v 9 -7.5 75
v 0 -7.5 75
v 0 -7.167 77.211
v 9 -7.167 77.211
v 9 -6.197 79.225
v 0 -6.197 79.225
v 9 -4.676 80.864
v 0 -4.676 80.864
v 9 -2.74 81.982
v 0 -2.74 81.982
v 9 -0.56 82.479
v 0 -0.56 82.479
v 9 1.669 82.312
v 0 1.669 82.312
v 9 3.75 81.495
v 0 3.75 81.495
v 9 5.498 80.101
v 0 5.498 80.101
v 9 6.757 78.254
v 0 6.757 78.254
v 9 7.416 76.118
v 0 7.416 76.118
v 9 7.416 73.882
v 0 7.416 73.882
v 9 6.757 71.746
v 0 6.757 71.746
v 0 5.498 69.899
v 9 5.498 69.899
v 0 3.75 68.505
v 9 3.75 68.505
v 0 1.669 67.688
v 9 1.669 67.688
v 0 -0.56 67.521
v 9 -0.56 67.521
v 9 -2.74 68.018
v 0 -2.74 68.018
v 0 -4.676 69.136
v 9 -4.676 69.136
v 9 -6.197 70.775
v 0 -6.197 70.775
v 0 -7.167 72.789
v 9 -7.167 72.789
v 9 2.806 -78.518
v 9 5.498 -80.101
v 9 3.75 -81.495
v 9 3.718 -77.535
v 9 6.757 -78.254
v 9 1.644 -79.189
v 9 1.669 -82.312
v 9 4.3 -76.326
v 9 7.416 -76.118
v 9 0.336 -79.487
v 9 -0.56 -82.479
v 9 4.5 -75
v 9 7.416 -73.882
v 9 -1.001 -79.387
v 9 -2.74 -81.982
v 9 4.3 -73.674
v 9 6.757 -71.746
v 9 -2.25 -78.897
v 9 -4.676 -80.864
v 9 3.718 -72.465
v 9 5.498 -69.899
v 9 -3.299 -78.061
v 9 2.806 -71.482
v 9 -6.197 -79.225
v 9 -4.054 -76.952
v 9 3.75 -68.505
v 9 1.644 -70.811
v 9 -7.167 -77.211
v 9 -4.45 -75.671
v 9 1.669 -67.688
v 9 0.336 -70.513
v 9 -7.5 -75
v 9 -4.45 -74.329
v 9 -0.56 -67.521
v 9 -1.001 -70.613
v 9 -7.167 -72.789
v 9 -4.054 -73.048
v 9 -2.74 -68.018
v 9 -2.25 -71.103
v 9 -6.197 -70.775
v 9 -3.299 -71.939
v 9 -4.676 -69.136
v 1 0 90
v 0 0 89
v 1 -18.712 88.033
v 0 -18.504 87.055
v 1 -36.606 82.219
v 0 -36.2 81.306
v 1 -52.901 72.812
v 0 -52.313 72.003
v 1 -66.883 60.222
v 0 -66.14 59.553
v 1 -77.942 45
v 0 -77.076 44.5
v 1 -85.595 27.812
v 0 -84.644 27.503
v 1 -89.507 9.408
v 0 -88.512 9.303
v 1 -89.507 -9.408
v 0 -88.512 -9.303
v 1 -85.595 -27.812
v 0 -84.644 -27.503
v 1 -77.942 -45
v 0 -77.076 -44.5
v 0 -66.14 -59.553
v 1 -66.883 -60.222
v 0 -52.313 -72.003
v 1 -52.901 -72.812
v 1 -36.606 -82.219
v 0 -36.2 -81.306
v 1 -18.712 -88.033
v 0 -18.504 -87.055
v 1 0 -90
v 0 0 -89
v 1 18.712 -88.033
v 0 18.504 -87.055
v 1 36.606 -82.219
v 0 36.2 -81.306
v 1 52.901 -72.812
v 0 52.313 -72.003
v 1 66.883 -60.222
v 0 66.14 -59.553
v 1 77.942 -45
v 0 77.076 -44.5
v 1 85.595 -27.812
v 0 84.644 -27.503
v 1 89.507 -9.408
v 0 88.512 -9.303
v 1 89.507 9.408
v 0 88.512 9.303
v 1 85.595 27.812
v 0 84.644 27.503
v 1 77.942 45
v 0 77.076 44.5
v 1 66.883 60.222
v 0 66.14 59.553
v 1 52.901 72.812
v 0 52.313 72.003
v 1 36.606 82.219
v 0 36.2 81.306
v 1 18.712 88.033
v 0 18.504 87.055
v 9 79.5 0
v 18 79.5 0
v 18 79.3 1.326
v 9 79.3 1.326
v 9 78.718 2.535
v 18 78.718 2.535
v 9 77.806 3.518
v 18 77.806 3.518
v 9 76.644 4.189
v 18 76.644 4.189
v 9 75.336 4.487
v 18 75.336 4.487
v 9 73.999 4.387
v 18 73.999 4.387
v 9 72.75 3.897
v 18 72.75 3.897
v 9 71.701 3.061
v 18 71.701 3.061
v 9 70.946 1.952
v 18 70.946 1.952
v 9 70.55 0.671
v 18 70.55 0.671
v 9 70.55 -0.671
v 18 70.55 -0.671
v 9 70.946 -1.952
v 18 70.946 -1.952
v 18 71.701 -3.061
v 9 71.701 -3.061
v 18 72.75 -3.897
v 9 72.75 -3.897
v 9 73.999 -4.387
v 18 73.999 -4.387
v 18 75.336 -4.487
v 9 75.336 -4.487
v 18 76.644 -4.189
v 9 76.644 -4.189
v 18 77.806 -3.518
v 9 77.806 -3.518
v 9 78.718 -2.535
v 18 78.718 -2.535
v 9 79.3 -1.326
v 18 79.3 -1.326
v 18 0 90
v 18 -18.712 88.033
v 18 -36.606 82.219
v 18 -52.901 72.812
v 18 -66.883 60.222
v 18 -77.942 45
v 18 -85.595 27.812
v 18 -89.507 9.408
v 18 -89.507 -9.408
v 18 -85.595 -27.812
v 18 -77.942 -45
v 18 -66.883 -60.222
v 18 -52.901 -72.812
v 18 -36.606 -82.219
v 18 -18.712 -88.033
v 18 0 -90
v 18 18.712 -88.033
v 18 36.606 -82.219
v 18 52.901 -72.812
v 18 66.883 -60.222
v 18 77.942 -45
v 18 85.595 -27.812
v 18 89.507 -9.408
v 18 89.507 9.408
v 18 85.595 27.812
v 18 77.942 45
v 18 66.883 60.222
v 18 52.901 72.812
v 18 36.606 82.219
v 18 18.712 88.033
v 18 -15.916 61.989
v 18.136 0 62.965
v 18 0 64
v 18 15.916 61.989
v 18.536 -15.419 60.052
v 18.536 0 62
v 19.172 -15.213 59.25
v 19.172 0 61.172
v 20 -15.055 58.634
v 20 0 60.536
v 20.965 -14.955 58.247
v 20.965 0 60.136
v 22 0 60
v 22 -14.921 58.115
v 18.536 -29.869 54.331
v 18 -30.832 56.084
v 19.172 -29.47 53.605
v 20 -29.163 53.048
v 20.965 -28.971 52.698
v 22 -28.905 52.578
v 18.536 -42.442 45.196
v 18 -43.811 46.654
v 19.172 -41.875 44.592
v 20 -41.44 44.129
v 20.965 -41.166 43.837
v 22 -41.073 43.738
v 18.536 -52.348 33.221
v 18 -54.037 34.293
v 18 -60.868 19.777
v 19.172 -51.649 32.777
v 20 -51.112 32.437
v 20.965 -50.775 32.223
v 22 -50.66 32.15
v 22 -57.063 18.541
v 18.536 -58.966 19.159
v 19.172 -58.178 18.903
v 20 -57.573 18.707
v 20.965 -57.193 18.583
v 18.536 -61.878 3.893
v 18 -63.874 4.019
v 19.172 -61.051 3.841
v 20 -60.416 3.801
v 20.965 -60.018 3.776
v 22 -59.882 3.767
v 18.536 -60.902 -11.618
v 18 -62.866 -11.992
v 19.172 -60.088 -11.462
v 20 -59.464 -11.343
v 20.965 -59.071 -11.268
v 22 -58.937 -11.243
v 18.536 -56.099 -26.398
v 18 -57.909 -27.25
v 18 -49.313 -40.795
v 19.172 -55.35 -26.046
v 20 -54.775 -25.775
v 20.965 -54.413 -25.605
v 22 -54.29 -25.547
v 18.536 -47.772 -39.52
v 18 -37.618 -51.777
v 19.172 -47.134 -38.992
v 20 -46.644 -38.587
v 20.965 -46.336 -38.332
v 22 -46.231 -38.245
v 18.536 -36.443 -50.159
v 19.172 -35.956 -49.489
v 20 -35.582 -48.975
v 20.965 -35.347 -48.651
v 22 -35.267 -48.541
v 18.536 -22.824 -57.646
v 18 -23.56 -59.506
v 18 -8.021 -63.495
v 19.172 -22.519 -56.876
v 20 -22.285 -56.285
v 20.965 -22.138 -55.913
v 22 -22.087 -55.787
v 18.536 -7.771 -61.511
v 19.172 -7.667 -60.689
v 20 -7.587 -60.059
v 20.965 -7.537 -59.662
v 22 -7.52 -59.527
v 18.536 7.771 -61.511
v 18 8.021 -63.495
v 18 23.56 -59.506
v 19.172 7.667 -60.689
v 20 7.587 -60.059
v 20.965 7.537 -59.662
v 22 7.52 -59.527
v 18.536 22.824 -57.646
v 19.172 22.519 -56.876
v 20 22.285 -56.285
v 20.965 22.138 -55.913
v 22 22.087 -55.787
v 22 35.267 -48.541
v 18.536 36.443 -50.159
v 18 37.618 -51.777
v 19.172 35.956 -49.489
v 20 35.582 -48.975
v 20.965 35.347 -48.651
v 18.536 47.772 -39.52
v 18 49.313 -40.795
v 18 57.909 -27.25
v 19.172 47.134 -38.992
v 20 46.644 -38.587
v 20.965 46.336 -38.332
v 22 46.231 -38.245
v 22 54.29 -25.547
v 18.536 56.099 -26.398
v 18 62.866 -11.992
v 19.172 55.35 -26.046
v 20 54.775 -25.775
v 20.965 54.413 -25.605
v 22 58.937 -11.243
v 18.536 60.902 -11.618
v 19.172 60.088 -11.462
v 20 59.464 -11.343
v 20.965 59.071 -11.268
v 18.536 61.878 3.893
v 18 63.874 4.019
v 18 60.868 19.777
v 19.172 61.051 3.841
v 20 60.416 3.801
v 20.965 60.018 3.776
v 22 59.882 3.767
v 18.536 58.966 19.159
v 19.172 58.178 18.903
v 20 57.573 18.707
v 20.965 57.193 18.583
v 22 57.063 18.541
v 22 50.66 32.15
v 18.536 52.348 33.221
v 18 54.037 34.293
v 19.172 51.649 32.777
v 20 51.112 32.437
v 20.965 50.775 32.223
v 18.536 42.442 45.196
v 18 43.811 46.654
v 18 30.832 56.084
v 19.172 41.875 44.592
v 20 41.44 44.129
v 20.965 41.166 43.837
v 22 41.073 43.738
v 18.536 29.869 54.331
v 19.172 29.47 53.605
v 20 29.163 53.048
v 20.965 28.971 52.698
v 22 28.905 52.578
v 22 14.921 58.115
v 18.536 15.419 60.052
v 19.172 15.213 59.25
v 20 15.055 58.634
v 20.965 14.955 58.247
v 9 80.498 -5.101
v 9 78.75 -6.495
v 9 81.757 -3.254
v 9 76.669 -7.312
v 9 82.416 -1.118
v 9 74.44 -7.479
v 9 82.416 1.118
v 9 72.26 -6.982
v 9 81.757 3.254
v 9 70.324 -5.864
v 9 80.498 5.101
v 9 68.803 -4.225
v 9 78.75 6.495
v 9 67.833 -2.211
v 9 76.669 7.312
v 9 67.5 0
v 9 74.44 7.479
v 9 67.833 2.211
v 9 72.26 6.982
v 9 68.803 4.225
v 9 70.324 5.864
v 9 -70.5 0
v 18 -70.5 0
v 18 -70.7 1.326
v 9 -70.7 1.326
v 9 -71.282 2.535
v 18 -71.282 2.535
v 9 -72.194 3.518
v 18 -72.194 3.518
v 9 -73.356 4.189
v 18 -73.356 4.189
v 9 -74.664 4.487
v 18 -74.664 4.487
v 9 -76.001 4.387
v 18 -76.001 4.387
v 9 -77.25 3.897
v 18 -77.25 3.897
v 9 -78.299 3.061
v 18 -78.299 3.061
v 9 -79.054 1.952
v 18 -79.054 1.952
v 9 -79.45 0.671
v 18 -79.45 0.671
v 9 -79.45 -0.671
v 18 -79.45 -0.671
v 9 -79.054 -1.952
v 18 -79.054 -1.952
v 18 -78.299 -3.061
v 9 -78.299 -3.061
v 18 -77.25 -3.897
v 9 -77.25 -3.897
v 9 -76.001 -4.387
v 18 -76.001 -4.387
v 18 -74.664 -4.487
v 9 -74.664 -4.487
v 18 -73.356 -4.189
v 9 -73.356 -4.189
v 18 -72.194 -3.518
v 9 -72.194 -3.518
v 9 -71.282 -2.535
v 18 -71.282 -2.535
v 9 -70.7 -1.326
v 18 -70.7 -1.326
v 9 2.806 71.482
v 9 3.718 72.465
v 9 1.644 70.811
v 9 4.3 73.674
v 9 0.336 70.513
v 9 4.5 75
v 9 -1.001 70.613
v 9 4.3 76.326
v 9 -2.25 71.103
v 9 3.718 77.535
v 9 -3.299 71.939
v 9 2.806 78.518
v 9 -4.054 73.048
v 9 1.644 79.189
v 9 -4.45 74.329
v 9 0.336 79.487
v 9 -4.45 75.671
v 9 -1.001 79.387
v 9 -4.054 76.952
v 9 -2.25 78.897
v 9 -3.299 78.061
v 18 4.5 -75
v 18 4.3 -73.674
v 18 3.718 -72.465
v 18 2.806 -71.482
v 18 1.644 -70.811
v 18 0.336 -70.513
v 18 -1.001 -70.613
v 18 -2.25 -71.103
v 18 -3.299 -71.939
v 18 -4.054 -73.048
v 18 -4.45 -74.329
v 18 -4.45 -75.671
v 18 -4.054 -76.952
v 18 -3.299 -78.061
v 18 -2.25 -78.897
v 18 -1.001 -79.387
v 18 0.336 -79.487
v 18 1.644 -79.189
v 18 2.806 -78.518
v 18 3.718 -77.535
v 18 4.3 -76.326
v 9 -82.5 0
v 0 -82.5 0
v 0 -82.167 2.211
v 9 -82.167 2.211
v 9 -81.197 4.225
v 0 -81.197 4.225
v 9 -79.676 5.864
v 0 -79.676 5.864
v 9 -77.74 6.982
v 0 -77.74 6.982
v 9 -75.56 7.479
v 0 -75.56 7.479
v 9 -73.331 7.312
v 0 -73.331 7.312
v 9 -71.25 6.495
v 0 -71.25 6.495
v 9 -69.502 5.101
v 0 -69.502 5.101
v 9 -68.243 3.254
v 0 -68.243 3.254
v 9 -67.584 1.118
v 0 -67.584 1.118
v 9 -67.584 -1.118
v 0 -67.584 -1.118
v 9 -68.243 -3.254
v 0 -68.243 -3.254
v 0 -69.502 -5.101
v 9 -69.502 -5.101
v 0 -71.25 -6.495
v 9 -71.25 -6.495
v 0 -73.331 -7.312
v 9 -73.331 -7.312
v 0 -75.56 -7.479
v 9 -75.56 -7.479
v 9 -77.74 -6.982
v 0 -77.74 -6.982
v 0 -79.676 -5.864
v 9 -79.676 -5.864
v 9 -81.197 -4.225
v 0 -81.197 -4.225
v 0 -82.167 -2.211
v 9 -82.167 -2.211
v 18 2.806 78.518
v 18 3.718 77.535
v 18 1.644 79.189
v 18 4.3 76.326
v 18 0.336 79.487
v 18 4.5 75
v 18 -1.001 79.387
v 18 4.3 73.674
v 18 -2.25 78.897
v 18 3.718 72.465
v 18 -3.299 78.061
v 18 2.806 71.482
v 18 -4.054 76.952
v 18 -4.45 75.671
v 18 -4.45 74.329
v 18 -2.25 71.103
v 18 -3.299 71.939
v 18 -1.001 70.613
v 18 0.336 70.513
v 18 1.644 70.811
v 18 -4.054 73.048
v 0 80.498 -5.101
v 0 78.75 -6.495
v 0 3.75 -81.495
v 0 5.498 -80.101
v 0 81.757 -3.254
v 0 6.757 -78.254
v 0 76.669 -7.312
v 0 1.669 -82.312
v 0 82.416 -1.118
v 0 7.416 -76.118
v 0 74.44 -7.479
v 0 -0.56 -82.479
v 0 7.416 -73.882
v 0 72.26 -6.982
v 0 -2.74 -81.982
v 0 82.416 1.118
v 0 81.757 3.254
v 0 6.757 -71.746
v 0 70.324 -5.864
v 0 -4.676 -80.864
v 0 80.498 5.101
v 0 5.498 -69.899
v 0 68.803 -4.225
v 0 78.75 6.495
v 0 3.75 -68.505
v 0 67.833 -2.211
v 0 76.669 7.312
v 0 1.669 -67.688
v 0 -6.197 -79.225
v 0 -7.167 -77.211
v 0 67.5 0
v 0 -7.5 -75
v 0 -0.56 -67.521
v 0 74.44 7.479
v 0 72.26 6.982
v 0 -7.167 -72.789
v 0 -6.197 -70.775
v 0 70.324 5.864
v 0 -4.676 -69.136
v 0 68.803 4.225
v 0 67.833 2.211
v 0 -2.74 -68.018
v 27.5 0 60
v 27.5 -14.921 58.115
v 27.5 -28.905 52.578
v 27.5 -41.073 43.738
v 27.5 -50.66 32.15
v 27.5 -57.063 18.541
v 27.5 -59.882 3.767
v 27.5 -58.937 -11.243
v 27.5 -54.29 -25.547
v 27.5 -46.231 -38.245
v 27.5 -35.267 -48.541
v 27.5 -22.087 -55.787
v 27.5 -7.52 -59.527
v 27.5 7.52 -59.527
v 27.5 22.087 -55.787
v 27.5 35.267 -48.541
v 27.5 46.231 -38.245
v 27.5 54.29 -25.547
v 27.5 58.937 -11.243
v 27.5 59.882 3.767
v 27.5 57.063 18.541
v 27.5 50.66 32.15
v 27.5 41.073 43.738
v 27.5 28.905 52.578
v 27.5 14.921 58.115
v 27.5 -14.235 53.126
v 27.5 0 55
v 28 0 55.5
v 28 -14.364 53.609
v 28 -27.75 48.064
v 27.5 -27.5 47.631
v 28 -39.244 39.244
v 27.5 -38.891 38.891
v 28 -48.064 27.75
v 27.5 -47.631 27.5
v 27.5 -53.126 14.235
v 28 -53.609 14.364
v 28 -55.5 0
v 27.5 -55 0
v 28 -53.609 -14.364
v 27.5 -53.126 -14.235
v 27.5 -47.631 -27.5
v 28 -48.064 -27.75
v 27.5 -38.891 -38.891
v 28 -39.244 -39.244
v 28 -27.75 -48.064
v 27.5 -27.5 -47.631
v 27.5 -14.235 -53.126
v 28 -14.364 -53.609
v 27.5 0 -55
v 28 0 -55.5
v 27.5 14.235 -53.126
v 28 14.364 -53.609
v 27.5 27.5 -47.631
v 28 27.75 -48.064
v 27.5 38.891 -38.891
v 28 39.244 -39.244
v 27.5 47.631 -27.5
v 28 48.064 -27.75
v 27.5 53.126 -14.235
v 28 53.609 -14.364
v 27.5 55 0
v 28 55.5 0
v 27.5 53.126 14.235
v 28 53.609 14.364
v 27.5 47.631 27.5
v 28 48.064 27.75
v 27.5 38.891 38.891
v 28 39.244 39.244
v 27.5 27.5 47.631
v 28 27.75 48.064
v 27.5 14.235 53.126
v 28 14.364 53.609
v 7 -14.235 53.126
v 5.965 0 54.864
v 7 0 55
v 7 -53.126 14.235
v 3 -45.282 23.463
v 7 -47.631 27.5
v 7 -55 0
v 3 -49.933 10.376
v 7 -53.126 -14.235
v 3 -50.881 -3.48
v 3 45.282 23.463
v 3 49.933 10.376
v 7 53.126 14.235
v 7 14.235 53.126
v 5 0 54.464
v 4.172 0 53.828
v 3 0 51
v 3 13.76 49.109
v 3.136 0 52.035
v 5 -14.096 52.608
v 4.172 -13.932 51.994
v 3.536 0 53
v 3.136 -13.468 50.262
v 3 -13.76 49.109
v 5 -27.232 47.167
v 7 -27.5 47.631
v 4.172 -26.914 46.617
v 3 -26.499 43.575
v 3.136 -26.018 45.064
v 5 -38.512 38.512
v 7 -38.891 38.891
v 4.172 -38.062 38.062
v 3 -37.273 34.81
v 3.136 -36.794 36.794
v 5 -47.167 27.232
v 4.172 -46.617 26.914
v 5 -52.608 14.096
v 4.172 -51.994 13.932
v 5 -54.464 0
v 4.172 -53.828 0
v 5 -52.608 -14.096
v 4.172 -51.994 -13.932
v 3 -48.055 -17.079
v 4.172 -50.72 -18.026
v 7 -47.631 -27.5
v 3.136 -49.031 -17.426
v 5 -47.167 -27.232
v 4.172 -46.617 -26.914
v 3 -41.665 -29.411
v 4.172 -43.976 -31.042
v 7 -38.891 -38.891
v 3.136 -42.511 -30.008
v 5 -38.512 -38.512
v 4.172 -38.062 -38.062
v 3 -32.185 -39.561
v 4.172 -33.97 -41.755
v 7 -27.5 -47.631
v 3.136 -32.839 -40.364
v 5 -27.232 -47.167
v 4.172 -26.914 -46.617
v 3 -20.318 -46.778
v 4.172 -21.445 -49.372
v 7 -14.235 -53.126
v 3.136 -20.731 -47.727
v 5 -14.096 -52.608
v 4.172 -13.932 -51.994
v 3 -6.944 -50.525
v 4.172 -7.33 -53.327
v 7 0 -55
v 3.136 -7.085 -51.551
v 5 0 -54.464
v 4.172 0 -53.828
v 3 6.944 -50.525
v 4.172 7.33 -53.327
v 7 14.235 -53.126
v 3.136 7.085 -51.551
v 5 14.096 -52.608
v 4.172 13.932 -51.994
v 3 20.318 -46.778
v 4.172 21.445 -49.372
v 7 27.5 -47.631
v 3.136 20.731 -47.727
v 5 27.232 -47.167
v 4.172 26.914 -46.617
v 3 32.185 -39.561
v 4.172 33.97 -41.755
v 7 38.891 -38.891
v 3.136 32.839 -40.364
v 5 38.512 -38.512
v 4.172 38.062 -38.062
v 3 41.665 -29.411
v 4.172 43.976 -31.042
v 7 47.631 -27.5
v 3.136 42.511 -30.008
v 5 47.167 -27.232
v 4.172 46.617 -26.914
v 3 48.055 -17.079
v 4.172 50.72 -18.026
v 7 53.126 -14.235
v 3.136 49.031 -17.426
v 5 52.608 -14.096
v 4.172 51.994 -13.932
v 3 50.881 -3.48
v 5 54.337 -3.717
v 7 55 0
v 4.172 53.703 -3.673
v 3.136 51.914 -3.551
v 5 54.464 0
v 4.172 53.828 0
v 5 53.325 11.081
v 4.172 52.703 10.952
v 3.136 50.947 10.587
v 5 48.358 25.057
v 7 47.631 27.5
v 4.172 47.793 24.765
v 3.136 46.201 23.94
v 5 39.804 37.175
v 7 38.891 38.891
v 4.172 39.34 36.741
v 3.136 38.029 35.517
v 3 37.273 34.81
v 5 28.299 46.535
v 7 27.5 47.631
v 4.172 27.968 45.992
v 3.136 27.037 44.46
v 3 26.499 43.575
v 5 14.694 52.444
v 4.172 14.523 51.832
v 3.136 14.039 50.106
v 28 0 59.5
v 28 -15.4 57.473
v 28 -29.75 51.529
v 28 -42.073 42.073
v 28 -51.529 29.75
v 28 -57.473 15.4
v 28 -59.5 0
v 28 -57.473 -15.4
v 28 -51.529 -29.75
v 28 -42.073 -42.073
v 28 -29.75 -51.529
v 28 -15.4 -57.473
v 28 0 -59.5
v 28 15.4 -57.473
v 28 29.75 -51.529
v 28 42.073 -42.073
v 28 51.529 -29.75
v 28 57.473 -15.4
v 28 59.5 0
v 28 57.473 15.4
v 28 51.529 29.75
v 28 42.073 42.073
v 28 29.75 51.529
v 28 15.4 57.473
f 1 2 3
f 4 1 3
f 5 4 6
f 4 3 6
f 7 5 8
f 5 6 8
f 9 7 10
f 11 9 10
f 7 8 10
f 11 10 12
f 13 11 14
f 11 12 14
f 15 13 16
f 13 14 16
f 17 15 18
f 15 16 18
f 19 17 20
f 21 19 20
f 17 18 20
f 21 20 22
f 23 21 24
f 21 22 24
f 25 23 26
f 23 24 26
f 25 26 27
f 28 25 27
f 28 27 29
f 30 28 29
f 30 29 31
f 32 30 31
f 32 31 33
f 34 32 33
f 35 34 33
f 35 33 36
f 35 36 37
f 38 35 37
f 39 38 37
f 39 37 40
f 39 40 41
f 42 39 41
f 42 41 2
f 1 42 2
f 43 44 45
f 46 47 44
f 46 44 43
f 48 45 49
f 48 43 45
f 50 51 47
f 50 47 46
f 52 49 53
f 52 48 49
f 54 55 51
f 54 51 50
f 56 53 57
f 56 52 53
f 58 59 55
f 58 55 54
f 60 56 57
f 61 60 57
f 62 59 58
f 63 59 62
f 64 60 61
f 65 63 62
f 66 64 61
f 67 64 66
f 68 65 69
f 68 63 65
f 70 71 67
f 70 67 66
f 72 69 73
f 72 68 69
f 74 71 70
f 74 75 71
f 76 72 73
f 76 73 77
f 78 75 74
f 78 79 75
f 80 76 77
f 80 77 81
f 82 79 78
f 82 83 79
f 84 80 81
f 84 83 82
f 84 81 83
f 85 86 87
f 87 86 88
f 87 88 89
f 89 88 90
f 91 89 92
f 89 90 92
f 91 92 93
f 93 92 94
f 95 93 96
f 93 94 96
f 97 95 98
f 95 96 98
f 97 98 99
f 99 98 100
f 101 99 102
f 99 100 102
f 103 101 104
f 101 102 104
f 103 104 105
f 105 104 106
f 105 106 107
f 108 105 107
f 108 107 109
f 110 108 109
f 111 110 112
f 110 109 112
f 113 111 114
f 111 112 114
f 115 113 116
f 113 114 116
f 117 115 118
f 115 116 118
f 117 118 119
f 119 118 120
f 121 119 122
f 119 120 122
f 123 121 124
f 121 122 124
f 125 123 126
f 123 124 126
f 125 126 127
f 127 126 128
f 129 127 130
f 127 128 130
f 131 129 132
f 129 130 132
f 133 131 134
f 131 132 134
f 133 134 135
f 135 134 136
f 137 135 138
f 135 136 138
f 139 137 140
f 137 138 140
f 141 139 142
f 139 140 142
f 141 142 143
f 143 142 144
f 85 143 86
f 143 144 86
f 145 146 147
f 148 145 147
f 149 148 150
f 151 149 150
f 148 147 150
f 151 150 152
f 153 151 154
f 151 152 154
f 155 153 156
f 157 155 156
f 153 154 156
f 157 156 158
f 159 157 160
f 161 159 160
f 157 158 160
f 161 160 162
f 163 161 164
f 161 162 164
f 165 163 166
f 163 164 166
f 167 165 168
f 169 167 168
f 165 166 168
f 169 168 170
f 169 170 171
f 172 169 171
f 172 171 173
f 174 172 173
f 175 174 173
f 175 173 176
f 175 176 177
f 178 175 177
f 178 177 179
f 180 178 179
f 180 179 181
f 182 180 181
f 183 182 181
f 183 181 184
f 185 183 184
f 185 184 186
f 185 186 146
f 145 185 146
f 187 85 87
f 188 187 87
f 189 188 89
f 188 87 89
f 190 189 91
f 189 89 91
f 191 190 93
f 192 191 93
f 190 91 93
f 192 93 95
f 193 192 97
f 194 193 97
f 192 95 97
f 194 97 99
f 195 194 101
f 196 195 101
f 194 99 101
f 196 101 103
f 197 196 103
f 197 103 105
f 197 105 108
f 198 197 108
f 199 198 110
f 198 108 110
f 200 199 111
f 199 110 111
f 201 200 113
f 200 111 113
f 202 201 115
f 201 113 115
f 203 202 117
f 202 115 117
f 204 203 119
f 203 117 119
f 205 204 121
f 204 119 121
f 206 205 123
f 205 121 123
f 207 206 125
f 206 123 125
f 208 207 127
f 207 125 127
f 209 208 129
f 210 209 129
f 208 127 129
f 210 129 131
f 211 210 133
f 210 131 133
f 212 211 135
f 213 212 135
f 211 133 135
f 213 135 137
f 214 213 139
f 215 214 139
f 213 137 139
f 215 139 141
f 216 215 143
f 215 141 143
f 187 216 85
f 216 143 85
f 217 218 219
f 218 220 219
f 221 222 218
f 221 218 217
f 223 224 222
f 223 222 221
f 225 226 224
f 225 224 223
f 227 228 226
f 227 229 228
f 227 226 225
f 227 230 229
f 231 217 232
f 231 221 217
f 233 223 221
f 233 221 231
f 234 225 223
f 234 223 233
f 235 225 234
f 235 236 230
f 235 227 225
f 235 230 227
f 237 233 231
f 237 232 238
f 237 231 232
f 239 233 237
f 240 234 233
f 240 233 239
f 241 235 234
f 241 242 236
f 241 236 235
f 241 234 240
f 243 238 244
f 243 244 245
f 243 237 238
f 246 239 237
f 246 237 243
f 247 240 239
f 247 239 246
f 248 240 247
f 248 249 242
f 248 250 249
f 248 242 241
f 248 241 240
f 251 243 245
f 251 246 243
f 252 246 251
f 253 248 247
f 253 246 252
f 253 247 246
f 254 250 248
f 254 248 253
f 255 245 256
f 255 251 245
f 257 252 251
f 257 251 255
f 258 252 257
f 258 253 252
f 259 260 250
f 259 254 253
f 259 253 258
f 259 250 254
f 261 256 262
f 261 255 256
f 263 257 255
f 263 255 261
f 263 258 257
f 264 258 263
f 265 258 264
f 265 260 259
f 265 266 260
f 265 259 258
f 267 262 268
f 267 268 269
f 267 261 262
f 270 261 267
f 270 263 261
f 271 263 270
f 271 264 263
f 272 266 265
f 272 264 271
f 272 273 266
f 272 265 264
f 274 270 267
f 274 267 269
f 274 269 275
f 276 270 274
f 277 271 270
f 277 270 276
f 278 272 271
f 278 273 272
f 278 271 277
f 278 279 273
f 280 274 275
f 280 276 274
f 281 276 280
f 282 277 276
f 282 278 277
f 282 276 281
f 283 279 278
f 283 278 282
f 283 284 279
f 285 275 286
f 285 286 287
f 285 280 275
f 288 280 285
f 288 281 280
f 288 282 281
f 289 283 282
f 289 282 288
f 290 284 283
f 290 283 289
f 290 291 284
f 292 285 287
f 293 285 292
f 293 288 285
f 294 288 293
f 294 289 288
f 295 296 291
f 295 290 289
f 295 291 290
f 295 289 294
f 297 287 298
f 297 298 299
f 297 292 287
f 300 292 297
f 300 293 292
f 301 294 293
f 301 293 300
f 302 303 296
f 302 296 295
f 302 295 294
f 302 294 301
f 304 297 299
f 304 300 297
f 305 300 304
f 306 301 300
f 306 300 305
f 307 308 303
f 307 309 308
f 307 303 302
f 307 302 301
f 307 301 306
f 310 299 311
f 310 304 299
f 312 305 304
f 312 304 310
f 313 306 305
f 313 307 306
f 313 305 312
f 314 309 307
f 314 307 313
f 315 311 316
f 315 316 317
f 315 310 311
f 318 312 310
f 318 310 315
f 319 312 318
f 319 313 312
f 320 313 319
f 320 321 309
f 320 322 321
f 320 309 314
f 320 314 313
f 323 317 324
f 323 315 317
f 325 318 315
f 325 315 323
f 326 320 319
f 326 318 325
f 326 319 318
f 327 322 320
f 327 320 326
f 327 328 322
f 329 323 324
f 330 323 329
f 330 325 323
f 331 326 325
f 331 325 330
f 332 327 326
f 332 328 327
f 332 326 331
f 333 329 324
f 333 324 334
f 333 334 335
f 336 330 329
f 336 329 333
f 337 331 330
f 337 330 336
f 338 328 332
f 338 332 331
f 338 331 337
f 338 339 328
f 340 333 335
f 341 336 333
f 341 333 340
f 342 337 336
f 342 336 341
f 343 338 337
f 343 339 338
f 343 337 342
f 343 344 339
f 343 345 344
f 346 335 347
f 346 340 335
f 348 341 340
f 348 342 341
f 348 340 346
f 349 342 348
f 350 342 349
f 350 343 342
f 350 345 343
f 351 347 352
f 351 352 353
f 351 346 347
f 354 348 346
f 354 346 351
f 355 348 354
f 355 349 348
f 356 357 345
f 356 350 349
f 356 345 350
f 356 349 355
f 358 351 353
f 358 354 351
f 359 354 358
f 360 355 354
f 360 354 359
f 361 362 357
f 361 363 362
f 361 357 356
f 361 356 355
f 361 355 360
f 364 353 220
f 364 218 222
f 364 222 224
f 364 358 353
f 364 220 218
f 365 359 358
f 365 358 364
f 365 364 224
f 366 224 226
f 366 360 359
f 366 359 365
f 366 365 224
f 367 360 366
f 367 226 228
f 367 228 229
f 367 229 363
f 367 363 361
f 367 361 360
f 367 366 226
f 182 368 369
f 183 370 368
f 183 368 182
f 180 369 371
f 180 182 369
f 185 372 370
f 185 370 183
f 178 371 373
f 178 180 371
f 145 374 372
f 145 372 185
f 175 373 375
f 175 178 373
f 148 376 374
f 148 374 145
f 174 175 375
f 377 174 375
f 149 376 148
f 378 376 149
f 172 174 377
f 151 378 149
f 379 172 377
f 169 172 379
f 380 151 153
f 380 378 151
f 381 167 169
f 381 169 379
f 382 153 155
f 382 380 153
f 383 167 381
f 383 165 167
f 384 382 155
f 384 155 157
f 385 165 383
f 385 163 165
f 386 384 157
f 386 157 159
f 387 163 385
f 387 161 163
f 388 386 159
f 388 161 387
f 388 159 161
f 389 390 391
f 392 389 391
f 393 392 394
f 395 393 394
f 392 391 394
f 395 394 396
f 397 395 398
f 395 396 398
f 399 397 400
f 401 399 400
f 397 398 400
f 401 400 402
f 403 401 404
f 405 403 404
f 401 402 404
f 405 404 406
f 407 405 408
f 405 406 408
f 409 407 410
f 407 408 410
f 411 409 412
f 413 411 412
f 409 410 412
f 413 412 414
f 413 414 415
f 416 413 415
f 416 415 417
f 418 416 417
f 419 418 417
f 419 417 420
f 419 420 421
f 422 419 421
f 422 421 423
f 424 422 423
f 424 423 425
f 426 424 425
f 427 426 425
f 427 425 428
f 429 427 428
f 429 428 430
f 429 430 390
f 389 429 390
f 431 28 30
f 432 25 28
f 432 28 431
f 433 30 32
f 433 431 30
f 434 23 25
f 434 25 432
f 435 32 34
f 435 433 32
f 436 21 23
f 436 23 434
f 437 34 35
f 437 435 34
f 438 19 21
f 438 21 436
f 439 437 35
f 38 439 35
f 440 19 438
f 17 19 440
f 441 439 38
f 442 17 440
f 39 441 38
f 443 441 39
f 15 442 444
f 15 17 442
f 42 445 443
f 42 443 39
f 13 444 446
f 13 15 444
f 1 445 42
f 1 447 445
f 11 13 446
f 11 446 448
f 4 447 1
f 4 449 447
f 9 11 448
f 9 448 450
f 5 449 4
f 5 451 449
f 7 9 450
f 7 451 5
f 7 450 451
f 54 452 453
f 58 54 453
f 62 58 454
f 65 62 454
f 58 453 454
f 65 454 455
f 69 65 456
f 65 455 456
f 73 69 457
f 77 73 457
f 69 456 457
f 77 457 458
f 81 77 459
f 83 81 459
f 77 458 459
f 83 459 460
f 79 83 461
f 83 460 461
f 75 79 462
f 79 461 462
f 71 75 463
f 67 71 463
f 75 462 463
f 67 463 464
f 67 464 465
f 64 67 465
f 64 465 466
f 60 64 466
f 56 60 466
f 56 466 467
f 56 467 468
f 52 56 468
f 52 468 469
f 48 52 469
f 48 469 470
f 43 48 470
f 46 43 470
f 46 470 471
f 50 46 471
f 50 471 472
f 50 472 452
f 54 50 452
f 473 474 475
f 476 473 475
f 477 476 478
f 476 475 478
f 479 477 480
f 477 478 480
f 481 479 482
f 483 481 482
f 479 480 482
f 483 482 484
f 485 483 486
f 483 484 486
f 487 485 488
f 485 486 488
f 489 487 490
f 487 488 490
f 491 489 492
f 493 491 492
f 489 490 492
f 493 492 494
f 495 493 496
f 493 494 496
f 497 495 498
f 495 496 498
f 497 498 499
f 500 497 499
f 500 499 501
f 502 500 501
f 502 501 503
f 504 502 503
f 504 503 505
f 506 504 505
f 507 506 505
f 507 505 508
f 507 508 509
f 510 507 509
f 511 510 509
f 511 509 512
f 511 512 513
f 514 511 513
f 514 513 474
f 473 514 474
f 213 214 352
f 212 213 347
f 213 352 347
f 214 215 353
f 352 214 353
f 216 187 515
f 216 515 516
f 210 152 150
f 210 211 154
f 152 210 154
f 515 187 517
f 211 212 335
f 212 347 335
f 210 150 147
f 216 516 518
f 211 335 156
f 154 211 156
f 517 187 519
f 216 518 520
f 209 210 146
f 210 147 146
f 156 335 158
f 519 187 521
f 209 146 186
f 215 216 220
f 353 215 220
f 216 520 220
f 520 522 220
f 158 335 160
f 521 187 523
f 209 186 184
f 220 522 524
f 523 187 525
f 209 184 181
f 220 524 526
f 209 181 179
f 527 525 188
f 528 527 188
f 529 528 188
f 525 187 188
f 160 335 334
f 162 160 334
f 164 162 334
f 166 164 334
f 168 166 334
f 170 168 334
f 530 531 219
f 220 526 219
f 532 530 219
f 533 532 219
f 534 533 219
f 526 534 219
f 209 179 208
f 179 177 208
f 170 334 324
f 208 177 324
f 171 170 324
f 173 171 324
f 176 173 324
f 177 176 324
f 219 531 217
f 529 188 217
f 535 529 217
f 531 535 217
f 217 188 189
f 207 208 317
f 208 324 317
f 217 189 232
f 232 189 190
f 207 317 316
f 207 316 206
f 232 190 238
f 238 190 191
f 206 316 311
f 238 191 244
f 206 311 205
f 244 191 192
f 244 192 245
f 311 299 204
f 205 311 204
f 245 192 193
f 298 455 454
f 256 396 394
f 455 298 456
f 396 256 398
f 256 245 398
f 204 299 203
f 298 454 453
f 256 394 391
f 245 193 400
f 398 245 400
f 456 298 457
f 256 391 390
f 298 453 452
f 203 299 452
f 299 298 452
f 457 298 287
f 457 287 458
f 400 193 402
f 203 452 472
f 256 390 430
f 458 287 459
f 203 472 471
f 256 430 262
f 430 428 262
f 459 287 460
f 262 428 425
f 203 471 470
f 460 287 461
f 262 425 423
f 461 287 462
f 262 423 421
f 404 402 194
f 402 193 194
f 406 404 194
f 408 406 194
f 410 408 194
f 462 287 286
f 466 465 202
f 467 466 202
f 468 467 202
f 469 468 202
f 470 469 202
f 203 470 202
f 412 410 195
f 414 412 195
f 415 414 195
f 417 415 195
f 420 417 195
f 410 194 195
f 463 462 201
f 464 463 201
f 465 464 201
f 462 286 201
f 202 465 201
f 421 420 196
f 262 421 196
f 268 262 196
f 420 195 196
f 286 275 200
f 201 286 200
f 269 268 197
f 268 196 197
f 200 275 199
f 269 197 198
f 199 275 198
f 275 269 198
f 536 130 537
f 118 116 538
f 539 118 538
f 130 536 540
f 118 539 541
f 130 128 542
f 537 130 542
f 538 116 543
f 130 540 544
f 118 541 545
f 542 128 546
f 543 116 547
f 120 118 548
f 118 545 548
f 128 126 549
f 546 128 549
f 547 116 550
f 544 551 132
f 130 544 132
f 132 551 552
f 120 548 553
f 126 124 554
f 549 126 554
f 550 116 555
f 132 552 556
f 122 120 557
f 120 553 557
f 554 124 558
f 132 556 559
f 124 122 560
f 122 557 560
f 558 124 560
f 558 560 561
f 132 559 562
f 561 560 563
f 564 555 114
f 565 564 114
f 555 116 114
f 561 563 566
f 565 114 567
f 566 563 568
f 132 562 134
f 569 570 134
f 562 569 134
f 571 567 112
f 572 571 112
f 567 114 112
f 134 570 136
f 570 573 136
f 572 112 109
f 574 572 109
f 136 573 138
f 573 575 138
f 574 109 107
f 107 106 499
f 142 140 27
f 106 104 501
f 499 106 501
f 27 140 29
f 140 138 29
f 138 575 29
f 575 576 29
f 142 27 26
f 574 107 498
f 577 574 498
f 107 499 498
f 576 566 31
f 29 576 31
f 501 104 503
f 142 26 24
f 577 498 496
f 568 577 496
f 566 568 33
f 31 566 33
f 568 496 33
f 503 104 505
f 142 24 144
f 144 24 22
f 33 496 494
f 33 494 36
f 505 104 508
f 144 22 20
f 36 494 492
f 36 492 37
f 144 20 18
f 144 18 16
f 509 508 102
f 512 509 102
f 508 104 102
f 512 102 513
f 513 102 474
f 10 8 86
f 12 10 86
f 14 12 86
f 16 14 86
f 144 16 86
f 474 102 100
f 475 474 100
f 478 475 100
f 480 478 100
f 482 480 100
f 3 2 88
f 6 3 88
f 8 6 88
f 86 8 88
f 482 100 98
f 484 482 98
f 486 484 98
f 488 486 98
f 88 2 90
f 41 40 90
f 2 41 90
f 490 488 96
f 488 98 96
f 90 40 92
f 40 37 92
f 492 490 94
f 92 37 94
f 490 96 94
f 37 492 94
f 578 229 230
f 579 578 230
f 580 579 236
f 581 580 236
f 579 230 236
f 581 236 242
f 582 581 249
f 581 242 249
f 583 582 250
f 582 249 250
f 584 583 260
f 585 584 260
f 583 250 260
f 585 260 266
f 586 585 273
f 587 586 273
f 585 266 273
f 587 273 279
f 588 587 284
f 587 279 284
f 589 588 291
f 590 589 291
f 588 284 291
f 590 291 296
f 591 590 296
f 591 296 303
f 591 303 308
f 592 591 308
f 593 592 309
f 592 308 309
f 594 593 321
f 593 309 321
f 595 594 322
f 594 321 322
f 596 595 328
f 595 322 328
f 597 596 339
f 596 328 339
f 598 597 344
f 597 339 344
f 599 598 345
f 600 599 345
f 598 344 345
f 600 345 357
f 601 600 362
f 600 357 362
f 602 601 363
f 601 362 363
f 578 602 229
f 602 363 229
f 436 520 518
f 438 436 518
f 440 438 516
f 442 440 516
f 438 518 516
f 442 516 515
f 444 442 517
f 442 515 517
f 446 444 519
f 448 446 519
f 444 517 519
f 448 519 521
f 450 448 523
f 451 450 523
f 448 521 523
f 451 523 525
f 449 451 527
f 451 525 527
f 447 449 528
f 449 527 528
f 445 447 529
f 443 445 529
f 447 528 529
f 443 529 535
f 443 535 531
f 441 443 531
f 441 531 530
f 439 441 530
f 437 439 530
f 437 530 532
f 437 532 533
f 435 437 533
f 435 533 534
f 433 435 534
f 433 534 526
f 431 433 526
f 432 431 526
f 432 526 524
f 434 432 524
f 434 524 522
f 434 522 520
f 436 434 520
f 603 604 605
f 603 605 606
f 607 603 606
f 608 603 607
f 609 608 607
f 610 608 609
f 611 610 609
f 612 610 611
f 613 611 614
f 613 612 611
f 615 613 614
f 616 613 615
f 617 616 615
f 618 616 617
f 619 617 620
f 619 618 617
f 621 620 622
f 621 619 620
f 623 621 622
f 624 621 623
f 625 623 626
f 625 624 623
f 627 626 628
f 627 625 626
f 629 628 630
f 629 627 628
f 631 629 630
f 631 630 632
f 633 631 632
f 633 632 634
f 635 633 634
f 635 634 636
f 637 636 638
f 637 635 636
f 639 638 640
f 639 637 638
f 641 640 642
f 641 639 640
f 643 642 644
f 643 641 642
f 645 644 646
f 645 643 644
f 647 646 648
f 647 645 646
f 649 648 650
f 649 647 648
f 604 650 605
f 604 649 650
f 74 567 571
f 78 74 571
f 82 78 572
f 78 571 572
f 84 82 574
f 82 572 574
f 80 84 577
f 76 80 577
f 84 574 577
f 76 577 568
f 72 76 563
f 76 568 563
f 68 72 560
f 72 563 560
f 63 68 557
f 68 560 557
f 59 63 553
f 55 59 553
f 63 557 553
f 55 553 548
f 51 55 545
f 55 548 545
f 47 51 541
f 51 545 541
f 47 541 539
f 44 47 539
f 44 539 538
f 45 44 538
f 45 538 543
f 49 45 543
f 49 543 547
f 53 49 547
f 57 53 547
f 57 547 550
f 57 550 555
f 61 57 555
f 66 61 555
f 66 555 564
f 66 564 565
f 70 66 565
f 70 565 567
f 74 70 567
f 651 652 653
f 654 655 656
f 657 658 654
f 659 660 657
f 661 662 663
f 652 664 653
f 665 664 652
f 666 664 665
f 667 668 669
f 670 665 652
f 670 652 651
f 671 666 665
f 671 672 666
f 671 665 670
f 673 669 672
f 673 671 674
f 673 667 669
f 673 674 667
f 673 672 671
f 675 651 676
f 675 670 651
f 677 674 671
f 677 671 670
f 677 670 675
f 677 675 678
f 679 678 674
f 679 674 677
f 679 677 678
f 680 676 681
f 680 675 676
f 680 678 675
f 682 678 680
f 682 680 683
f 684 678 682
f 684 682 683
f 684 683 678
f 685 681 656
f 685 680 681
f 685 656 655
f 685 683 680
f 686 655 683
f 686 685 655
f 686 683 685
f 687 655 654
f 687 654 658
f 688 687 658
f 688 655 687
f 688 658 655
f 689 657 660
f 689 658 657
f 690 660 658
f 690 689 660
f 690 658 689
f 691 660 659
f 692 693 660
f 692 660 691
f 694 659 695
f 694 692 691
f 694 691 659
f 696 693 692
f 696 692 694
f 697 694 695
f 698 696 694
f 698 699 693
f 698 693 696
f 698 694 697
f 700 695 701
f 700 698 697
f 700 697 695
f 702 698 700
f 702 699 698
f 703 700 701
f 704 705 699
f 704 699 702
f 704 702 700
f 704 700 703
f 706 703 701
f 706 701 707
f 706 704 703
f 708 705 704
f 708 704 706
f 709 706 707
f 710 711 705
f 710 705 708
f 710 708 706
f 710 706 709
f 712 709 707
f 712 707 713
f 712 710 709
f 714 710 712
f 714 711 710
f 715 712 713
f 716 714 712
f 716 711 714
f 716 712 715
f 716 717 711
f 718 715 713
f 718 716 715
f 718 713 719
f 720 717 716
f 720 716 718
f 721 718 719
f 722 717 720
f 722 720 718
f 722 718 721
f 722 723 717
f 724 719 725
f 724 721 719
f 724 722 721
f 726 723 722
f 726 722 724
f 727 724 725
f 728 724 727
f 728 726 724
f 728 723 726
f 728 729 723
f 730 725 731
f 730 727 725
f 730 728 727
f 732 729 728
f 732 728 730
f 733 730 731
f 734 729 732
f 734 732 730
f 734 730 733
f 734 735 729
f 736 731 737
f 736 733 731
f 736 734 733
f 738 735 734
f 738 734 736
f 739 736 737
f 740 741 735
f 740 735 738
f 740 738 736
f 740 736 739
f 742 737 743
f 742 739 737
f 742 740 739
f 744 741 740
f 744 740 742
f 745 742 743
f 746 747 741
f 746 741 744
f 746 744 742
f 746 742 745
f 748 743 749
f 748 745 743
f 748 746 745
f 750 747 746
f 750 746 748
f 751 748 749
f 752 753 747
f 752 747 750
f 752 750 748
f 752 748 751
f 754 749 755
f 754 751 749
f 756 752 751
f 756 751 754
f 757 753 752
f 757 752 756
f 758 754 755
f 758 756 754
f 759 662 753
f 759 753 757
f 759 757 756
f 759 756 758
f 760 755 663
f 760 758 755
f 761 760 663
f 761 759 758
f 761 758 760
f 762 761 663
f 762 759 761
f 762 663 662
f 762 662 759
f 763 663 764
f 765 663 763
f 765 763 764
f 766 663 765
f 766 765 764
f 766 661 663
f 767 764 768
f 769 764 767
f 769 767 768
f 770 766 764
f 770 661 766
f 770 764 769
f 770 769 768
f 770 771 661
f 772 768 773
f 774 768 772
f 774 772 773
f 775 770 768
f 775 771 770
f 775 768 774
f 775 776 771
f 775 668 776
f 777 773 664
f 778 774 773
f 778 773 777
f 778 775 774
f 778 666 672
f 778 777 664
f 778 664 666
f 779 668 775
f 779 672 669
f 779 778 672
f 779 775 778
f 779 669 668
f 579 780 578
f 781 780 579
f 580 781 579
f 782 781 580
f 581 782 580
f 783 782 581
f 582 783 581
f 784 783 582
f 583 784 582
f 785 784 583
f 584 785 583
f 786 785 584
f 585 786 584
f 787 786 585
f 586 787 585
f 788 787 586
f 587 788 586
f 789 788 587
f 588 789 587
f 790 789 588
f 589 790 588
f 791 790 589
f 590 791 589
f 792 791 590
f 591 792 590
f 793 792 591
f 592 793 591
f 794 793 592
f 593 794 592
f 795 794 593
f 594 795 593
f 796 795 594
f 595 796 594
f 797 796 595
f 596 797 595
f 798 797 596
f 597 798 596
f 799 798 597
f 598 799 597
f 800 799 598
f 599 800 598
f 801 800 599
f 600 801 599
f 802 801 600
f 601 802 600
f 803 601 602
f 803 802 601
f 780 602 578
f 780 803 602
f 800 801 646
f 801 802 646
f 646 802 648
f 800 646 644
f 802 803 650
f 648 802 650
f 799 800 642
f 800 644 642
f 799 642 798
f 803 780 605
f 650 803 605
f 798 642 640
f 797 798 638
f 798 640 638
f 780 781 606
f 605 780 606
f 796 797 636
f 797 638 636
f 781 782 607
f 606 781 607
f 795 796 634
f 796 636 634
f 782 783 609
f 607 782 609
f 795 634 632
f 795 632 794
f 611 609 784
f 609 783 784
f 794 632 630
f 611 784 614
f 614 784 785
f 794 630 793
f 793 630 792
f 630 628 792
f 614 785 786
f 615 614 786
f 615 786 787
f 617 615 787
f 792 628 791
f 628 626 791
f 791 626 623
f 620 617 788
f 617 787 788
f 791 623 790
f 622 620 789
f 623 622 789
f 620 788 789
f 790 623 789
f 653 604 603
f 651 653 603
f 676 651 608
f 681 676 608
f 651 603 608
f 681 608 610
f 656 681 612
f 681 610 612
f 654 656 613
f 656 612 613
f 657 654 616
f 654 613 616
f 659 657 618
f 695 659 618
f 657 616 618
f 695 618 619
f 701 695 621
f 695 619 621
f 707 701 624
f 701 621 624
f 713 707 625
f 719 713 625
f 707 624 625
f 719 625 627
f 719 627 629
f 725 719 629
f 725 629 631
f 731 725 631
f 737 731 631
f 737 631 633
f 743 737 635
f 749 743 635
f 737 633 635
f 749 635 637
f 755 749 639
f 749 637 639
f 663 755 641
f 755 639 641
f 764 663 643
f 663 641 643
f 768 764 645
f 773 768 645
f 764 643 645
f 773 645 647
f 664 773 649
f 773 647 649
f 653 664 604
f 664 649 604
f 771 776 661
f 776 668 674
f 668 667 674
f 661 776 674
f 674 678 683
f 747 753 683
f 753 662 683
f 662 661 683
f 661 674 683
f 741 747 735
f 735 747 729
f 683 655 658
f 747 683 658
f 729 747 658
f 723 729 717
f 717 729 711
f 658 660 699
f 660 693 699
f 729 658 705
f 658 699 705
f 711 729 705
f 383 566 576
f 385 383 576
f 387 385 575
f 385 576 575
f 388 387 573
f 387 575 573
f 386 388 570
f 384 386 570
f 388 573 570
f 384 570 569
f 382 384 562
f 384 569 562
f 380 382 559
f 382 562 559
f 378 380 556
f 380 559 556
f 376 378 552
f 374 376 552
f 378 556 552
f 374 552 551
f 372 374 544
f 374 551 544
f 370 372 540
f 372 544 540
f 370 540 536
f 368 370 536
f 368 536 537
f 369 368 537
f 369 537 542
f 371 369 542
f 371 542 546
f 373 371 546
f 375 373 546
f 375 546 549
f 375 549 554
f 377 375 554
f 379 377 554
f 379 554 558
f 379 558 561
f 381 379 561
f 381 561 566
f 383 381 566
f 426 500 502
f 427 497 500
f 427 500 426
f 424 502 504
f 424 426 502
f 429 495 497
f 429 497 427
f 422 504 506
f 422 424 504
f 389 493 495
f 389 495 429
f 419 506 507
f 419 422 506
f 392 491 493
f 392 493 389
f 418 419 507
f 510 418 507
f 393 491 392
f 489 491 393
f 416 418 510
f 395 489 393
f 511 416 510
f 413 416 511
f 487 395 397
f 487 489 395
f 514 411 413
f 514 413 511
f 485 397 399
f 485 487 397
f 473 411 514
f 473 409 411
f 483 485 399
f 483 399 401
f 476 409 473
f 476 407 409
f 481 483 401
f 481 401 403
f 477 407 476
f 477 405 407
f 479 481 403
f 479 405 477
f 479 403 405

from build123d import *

# Parameters (mm, degrees)
F3_D           = 9
F3_DEPTH       = 18
F3_CBORE_D     = 15
F3_CBORE_DEPTH = 9
F4_R           = 4
F5_SIZE        = 0.5
F6_R           = 4
F7_SIZE        = 1


with BuildPart() as f1:
    # F0 (on Front) → F1 (revolve)
    with BuildSketch(Plane.XZ):
        Polygon((18, 90), (0, 90), (0, 0), (3, 0), (3, 55), (28, 55), (28, 60), (18, 60), align=None)
    revolve(axis=Axis((1.5, 0, 0), (1, 0, 0)))

    # F3
    with Locations(Plane(origin=(0, 0, 0), x_dir=(0, -1, 0), z_dir=(-1, 0, 0))):
        with Locations((0, 75), (75, 0), (0, -75), (-75, 0)):
            CounterBoreHole(F3_D / 2, F3_CBORE_D / 2, F3_CBORE_DEPTH, depth=F3_DEPTH)

    # F4
    f4_edges = [f1.edges().sort_by_distance(p)[0] for p in [
        (18, 0, -60),
    ]]
    fillet(f4_edges, radius=F4_R)

    # F5
    f5_edges = [f1.edges().sort_by_distance(p)[0] for p in [
        (28, 0, -60),
        (28, 0, -55),
    ]]
    chamfer(f5_edges, length=F5_SIZE)

    # F6
    f6_edges = [f1.edges().sort_by_distance(p)[0] for p in [
        (3, 0, -55),
    ]]
    fillet(f6_edges, radius=F6_R)

    # F7
    f7_edges = [f1.edges().sort_by_distance(p)[0] for p in [
        (0, 0, -90),
    ]]
    chamfer(f7_edges, length=F7_SIZE)


solid = f1.part
